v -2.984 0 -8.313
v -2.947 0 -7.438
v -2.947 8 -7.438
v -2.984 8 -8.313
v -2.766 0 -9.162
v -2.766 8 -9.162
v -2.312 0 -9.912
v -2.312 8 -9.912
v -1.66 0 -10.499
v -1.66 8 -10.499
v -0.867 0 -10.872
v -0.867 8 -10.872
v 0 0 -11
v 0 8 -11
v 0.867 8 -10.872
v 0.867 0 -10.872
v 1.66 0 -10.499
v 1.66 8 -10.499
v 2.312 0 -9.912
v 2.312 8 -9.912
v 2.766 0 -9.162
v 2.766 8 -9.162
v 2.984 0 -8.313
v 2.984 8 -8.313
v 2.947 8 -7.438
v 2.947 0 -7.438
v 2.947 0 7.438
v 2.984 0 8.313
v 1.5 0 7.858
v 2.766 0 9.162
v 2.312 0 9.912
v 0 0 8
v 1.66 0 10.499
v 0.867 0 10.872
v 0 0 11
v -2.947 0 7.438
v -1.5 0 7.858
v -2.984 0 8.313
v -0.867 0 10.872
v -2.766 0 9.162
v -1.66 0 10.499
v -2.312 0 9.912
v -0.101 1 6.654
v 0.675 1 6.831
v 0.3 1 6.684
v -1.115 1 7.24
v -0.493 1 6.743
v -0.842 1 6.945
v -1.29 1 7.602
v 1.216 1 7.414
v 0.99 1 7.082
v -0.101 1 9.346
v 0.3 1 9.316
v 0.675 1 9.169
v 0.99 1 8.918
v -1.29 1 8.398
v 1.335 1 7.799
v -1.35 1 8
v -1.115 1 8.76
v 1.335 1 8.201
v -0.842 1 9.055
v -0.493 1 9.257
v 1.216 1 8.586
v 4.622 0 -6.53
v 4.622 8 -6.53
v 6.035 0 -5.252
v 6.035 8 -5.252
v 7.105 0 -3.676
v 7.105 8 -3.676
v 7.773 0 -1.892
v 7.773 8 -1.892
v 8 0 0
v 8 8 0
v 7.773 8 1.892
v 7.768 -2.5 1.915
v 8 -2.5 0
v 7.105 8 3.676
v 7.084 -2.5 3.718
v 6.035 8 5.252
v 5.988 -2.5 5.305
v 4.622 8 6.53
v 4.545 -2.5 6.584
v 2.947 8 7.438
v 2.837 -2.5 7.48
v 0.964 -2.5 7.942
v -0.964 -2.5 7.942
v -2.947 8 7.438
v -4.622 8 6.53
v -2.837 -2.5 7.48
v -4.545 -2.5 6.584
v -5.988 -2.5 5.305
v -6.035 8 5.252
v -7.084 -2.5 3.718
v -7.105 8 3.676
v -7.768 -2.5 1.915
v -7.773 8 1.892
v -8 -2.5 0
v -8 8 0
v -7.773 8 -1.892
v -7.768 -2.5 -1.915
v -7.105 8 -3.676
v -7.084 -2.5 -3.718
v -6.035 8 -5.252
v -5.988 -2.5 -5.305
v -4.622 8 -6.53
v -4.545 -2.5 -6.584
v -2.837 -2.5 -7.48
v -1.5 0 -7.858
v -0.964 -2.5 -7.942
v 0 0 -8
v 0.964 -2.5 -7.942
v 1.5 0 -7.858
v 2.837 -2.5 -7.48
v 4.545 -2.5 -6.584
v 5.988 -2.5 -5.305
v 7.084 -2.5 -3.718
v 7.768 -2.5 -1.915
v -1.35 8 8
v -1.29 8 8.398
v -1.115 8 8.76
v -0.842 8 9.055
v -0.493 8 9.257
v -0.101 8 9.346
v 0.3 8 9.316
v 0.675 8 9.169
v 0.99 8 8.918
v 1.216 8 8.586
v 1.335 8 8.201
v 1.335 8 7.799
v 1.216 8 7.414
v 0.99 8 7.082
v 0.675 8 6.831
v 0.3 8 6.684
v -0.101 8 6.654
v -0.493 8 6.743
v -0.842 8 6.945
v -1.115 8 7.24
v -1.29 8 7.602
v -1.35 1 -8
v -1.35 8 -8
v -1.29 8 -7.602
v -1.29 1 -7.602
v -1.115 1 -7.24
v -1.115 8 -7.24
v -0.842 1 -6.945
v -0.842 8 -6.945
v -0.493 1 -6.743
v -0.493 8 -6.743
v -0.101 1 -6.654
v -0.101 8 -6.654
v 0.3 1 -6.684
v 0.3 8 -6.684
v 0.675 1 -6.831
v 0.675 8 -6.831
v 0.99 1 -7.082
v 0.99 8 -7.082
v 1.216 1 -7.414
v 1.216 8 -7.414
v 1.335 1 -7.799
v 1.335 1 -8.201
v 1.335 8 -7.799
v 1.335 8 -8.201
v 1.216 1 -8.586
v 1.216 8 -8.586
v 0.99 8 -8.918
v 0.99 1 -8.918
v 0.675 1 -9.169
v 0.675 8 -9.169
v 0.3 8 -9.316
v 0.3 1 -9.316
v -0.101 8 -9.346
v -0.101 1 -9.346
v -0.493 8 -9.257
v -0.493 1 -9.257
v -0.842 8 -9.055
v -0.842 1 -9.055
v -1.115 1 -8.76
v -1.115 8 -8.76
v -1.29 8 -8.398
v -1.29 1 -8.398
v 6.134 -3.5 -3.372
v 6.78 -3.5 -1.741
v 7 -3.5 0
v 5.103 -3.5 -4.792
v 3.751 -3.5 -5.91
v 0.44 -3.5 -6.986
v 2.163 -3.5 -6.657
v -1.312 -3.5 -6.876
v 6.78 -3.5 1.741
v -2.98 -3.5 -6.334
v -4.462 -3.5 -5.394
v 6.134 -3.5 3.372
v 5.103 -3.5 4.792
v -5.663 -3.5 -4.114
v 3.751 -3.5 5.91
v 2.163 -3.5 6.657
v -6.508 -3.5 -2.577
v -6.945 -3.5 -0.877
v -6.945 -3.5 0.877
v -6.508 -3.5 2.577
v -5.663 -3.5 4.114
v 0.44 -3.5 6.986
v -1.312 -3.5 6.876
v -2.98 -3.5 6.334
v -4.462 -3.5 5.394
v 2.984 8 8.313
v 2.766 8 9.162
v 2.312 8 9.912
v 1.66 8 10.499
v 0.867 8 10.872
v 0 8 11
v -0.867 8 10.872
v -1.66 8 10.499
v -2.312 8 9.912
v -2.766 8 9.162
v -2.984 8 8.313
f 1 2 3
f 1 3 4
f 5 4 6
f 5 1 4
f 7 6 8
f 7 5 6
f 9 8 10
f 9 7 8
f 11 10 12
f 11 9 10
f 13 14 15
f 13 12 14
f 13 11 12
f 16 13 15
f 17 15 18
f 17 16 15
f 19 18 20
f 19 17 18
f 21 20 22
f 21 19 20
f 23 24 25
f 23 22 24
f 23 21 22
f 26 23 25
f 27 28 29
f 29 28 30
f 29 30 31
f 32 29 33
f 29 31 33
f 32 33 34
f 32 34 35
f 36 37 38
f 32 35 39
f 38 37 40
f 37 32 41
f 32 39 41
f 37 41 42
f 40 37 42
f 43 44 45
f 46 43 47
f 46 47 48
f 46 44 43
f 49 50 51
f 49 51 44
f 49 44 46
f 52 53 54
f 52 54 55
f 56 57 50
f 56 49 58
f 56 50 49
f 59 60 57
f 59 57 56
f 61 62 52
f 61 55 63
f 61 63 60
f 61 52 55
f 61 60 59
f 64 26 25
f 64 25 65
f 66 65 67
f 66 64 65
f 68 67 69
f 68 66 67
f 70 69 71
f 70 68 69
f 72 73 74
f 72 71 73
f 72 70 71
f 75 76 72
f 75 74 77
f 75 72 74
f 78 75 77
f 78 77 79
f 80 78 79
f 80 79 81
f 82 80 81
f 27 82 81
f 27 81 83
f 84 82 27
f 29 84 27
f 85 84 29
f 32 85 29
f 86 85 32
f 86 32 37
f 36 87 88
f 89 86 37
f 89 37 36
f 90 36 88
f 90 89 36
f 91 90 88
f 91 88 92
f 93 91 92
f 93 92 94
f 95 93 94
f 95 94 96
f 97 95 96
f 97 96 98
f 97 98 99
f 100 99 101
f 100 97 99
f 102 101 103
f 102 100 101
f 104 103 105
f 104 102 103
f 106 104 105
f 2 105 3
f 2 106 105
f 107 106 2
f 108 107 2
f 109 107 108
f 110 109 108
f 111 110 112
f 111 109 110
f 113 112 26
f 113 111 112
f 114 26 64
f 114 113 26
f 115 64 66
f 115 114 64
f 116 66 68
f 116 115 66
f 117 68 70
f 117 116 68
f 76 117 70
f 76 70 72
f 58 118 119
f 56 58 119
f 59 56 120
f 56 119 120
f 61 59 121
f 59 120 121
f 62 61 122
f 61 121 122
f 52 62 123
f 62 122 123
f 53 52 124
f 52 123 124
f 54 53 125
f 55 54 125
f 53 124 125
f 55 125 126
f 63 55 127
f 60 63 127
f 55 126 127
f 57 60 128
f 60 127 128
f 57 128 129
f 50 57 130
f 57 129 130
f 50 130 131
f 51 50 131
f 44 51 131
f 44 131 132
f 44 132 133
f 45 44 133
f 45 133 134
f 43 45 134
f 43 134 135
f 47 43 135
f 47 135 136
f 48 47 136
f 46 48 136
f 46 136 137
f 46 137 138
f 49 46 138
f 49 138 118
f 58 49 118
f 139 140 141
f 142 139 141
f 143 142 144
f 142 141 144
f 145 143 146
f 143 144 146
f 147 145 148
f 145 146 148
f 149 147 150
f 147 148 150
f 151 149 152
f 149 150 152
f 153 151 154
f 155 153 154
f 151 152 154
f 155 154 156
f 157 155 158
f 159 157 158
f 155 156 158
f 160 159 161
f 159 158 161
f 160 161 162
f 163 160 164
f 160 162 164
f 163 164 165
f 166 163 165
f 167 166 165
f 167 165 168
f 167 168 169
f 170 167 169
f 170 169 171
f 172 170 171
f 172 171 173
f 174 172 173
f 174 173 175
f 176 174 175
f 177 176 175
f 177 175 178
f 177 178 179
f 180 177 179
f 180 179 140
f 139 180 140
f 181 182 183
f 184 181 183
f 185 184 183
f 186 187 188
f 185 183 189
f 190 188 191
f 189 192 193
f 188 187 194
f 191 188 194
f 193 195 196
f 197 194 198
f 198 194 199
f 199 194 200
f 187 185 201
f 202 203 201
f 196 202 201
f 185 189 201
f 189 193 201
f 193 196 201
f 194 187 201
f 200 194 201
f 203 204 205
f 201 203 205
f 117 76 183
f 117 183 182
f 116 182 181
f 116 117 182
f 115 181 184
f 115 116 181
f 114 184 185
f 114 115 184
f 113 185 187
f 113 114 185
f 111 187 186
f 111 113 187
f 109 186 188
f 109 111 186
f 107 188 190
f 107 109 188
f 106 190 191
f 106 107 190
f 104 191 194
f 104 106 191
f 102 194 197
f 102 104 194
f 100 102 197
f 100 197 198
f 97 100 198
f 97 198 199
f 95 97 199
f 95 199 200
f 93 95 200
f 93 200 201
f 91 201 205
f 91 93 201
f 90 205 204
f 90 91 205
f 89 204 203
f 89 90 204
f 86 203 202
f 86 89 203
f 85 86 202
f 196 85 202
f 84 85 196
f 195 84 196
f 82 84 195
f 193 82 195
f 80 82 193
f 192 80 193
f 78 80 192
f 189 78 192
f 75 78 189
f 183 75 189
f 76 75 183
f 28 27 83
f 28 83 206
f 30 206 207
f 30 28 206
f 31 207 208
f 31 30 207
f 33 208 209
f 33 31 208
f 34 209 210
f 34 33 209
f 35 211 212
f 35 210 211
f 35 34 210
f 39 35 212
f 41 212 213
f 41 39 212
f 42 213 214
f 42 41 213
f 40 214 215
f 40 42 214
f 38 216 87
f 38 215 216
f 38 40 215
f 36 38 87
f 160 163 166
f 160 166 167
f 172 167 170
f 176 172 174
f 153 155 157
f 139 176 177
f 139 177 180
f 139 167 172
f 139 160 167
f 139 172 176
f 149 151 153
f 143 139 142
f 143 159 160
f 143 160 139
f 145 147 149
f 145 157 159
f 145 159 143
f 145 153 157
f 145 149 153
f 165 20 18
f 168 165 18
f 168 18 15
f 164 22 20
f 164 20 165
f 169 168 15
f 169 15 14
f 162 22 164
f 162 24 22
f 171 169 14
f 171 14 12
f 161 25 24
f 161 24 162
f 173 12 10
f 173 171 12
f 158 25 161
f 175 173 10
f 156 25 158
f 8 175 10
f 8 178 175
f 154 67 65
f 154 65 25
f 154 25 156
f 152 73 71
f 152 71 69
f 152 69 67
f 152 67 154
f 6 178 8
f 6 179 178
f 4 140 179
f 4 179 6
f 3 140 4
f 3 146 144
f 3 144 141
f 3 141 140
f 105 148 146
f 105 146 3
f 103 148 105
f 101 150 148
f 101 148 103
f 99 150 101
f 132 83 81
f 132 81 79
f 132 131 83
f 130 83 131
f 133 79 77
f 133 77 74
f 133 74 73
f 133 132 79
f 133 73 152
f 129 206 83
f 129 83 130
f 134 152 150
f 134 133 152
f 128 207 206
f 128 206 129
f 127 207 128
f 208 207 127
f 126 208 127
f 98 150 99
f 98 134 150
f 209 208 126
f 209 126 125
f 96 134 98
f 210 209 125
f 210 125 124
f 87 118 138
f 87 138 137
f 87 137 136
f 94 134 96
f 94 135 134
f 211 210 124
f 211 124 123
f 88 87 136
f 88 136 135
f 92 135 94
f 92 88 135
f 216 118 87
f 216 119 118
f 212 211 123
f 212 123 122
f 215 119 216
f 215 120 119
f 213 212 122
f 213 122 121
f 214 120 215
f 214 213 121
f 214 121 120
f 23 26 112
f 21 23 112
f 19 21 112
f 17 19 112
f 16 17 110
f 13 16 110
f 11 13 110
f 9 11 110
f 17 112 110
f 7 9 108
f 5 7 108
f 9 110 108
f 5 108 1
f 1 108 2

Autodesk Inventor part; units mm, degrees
ref_plane "YZ Plane" through (0, 0, 0) normal (1, 0, 0) x (0, 1, 0)
ref_plane "XZ Plane" through (0, 0, 0) normal (0, 1, 0) x (-1, 0, 0)
ref_plane "XY Plane" through (0, 0, 0) normal (0, 0, 1) x (1, 0, 0)
sketch "Sketch1" plane through (0, 0, 0) normal (0, 1, 0) x (-1, 0, 0)
  line L0 (0, 0) -> (23.6236, 0) construction
  line L1 (0, 0) -> (0, -20.0966) construction
  arc A0 (-8, 0) -> (8, 0) centre (0, 0) ccw
  arc A1 (-2.9468, -7.4375) -> (2.9468, -7.4375) centre (0, -8) ccw
  line L2 (0, -11) -> (-8.5189, -11) construction
  circle A2 centre (0, -8) radius 1.35
  line L3 (-8, 0) -> (8, 0)
  arc A3 (8, 0) -> (-8, 0) centre (0, 0) ccw
  arc A4 (2.9468, 7.4375) -> (-2.9468, 7.4375) centre (0, 8) ccw
  line L4 (0, 11) -> (-8.5189, 11) construction
  circle A5 centre (0, 8) radius 1.35
  dimension "d0" = 16
  dimension "d1" = 22
  dimension "d2" = 6
  dimension "d3" = 2.7
extrude "Extrusion1" add sketch "Sketch1" along normal blind 8
extrude "Extrusion2" cut sketch "Sketch1" against normal blind 7 from surface at 8 contours A2 A0 | A0 A2 | A5 A3 | A3 A5
extrude "Extrusion3" add sketch "Sketch1" against normal blind 3.5 contours L3 A0 A2 | A3 A5 L3 | A2 A0 | A3 A5 picked at (0, -7.5415) picked at (0, 7.5415)
chamfer "Chamfer1" distance 1 angle 45 1 edges at (2.9468, -3.5, 7.4375)
properties part number "caster_body"
